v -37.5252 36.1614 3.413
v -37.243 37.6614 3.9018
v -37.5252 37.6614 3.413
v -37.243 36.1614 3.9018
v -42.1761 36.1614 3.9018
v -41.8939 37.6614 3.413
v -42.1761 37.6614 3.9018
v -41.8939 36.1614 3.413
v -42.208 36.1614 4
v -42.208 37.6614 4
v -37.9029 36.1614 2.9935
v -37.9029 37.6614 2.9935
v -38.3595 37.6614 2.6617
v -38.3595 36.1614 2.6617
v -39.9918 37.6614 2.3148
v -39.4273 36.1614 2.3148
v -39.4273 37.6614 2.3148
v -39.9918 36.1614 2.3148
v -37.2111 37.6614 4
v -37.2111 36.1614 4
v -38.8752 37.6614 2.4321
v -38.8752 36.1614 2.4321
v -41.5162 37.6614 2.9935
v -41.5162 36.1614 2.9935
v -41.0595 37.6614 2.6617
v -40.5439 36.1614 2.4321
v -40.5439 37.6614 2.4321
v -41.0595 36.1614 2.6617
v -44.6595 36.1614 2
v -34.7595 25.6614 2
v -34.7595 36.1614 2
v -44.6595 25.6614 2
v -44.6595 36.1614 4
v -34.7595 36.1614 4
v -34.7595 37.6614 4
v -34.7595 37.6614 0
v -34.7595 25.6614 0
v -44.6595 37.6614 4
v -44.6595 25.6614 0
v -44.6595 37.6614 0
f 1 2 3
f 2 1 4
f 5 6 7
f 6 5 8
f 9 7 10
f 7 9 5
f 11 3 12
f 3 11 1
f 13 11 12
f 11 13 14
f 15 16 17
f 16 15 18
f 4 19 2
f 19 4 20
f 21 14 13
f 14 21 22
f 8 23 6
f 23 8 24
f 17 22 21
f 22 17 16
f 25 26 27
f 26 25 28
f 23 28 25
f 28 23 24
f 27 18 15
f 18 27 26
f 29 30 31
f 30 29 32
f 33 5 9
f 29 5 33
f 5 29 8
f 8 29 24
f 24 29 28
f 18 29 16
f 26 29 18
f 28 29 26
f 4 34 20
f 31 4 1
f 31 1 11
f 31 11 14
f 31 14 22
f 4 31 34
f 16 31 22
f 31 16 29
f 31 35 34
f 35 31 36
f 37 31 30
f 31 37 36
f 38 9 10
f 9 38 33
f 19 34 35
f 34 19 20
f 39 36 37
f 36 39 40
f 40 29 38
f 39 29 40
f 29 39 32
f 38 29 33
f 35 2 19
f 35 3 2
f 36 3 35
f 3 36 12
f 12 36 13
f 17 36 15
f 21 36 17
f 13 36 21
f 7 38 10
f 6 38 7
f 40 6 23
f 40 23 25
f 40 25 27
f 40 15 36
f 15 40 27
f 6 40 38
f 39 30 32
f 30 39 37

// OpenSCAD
difference () {
  union () {
    translate ([-39.70953167499939, 31.661440427991682, 2]) {
      cube ([9.9, 12, 4], center=true);
    }
  }
  union () {
    translate ([-39.70953167499939, 37.66144042799168, 5]) {
      rotate (a=90.0, v=[1, 0, 0]) {
        cylinder ($fn=30, h=20, r=2.7, center=true);
      }
    }
    translate ([-39.70953167499939, 30.661440427991682, 5]) {
      cube ([10, 11, 6], center=true);
    }
  }
}
